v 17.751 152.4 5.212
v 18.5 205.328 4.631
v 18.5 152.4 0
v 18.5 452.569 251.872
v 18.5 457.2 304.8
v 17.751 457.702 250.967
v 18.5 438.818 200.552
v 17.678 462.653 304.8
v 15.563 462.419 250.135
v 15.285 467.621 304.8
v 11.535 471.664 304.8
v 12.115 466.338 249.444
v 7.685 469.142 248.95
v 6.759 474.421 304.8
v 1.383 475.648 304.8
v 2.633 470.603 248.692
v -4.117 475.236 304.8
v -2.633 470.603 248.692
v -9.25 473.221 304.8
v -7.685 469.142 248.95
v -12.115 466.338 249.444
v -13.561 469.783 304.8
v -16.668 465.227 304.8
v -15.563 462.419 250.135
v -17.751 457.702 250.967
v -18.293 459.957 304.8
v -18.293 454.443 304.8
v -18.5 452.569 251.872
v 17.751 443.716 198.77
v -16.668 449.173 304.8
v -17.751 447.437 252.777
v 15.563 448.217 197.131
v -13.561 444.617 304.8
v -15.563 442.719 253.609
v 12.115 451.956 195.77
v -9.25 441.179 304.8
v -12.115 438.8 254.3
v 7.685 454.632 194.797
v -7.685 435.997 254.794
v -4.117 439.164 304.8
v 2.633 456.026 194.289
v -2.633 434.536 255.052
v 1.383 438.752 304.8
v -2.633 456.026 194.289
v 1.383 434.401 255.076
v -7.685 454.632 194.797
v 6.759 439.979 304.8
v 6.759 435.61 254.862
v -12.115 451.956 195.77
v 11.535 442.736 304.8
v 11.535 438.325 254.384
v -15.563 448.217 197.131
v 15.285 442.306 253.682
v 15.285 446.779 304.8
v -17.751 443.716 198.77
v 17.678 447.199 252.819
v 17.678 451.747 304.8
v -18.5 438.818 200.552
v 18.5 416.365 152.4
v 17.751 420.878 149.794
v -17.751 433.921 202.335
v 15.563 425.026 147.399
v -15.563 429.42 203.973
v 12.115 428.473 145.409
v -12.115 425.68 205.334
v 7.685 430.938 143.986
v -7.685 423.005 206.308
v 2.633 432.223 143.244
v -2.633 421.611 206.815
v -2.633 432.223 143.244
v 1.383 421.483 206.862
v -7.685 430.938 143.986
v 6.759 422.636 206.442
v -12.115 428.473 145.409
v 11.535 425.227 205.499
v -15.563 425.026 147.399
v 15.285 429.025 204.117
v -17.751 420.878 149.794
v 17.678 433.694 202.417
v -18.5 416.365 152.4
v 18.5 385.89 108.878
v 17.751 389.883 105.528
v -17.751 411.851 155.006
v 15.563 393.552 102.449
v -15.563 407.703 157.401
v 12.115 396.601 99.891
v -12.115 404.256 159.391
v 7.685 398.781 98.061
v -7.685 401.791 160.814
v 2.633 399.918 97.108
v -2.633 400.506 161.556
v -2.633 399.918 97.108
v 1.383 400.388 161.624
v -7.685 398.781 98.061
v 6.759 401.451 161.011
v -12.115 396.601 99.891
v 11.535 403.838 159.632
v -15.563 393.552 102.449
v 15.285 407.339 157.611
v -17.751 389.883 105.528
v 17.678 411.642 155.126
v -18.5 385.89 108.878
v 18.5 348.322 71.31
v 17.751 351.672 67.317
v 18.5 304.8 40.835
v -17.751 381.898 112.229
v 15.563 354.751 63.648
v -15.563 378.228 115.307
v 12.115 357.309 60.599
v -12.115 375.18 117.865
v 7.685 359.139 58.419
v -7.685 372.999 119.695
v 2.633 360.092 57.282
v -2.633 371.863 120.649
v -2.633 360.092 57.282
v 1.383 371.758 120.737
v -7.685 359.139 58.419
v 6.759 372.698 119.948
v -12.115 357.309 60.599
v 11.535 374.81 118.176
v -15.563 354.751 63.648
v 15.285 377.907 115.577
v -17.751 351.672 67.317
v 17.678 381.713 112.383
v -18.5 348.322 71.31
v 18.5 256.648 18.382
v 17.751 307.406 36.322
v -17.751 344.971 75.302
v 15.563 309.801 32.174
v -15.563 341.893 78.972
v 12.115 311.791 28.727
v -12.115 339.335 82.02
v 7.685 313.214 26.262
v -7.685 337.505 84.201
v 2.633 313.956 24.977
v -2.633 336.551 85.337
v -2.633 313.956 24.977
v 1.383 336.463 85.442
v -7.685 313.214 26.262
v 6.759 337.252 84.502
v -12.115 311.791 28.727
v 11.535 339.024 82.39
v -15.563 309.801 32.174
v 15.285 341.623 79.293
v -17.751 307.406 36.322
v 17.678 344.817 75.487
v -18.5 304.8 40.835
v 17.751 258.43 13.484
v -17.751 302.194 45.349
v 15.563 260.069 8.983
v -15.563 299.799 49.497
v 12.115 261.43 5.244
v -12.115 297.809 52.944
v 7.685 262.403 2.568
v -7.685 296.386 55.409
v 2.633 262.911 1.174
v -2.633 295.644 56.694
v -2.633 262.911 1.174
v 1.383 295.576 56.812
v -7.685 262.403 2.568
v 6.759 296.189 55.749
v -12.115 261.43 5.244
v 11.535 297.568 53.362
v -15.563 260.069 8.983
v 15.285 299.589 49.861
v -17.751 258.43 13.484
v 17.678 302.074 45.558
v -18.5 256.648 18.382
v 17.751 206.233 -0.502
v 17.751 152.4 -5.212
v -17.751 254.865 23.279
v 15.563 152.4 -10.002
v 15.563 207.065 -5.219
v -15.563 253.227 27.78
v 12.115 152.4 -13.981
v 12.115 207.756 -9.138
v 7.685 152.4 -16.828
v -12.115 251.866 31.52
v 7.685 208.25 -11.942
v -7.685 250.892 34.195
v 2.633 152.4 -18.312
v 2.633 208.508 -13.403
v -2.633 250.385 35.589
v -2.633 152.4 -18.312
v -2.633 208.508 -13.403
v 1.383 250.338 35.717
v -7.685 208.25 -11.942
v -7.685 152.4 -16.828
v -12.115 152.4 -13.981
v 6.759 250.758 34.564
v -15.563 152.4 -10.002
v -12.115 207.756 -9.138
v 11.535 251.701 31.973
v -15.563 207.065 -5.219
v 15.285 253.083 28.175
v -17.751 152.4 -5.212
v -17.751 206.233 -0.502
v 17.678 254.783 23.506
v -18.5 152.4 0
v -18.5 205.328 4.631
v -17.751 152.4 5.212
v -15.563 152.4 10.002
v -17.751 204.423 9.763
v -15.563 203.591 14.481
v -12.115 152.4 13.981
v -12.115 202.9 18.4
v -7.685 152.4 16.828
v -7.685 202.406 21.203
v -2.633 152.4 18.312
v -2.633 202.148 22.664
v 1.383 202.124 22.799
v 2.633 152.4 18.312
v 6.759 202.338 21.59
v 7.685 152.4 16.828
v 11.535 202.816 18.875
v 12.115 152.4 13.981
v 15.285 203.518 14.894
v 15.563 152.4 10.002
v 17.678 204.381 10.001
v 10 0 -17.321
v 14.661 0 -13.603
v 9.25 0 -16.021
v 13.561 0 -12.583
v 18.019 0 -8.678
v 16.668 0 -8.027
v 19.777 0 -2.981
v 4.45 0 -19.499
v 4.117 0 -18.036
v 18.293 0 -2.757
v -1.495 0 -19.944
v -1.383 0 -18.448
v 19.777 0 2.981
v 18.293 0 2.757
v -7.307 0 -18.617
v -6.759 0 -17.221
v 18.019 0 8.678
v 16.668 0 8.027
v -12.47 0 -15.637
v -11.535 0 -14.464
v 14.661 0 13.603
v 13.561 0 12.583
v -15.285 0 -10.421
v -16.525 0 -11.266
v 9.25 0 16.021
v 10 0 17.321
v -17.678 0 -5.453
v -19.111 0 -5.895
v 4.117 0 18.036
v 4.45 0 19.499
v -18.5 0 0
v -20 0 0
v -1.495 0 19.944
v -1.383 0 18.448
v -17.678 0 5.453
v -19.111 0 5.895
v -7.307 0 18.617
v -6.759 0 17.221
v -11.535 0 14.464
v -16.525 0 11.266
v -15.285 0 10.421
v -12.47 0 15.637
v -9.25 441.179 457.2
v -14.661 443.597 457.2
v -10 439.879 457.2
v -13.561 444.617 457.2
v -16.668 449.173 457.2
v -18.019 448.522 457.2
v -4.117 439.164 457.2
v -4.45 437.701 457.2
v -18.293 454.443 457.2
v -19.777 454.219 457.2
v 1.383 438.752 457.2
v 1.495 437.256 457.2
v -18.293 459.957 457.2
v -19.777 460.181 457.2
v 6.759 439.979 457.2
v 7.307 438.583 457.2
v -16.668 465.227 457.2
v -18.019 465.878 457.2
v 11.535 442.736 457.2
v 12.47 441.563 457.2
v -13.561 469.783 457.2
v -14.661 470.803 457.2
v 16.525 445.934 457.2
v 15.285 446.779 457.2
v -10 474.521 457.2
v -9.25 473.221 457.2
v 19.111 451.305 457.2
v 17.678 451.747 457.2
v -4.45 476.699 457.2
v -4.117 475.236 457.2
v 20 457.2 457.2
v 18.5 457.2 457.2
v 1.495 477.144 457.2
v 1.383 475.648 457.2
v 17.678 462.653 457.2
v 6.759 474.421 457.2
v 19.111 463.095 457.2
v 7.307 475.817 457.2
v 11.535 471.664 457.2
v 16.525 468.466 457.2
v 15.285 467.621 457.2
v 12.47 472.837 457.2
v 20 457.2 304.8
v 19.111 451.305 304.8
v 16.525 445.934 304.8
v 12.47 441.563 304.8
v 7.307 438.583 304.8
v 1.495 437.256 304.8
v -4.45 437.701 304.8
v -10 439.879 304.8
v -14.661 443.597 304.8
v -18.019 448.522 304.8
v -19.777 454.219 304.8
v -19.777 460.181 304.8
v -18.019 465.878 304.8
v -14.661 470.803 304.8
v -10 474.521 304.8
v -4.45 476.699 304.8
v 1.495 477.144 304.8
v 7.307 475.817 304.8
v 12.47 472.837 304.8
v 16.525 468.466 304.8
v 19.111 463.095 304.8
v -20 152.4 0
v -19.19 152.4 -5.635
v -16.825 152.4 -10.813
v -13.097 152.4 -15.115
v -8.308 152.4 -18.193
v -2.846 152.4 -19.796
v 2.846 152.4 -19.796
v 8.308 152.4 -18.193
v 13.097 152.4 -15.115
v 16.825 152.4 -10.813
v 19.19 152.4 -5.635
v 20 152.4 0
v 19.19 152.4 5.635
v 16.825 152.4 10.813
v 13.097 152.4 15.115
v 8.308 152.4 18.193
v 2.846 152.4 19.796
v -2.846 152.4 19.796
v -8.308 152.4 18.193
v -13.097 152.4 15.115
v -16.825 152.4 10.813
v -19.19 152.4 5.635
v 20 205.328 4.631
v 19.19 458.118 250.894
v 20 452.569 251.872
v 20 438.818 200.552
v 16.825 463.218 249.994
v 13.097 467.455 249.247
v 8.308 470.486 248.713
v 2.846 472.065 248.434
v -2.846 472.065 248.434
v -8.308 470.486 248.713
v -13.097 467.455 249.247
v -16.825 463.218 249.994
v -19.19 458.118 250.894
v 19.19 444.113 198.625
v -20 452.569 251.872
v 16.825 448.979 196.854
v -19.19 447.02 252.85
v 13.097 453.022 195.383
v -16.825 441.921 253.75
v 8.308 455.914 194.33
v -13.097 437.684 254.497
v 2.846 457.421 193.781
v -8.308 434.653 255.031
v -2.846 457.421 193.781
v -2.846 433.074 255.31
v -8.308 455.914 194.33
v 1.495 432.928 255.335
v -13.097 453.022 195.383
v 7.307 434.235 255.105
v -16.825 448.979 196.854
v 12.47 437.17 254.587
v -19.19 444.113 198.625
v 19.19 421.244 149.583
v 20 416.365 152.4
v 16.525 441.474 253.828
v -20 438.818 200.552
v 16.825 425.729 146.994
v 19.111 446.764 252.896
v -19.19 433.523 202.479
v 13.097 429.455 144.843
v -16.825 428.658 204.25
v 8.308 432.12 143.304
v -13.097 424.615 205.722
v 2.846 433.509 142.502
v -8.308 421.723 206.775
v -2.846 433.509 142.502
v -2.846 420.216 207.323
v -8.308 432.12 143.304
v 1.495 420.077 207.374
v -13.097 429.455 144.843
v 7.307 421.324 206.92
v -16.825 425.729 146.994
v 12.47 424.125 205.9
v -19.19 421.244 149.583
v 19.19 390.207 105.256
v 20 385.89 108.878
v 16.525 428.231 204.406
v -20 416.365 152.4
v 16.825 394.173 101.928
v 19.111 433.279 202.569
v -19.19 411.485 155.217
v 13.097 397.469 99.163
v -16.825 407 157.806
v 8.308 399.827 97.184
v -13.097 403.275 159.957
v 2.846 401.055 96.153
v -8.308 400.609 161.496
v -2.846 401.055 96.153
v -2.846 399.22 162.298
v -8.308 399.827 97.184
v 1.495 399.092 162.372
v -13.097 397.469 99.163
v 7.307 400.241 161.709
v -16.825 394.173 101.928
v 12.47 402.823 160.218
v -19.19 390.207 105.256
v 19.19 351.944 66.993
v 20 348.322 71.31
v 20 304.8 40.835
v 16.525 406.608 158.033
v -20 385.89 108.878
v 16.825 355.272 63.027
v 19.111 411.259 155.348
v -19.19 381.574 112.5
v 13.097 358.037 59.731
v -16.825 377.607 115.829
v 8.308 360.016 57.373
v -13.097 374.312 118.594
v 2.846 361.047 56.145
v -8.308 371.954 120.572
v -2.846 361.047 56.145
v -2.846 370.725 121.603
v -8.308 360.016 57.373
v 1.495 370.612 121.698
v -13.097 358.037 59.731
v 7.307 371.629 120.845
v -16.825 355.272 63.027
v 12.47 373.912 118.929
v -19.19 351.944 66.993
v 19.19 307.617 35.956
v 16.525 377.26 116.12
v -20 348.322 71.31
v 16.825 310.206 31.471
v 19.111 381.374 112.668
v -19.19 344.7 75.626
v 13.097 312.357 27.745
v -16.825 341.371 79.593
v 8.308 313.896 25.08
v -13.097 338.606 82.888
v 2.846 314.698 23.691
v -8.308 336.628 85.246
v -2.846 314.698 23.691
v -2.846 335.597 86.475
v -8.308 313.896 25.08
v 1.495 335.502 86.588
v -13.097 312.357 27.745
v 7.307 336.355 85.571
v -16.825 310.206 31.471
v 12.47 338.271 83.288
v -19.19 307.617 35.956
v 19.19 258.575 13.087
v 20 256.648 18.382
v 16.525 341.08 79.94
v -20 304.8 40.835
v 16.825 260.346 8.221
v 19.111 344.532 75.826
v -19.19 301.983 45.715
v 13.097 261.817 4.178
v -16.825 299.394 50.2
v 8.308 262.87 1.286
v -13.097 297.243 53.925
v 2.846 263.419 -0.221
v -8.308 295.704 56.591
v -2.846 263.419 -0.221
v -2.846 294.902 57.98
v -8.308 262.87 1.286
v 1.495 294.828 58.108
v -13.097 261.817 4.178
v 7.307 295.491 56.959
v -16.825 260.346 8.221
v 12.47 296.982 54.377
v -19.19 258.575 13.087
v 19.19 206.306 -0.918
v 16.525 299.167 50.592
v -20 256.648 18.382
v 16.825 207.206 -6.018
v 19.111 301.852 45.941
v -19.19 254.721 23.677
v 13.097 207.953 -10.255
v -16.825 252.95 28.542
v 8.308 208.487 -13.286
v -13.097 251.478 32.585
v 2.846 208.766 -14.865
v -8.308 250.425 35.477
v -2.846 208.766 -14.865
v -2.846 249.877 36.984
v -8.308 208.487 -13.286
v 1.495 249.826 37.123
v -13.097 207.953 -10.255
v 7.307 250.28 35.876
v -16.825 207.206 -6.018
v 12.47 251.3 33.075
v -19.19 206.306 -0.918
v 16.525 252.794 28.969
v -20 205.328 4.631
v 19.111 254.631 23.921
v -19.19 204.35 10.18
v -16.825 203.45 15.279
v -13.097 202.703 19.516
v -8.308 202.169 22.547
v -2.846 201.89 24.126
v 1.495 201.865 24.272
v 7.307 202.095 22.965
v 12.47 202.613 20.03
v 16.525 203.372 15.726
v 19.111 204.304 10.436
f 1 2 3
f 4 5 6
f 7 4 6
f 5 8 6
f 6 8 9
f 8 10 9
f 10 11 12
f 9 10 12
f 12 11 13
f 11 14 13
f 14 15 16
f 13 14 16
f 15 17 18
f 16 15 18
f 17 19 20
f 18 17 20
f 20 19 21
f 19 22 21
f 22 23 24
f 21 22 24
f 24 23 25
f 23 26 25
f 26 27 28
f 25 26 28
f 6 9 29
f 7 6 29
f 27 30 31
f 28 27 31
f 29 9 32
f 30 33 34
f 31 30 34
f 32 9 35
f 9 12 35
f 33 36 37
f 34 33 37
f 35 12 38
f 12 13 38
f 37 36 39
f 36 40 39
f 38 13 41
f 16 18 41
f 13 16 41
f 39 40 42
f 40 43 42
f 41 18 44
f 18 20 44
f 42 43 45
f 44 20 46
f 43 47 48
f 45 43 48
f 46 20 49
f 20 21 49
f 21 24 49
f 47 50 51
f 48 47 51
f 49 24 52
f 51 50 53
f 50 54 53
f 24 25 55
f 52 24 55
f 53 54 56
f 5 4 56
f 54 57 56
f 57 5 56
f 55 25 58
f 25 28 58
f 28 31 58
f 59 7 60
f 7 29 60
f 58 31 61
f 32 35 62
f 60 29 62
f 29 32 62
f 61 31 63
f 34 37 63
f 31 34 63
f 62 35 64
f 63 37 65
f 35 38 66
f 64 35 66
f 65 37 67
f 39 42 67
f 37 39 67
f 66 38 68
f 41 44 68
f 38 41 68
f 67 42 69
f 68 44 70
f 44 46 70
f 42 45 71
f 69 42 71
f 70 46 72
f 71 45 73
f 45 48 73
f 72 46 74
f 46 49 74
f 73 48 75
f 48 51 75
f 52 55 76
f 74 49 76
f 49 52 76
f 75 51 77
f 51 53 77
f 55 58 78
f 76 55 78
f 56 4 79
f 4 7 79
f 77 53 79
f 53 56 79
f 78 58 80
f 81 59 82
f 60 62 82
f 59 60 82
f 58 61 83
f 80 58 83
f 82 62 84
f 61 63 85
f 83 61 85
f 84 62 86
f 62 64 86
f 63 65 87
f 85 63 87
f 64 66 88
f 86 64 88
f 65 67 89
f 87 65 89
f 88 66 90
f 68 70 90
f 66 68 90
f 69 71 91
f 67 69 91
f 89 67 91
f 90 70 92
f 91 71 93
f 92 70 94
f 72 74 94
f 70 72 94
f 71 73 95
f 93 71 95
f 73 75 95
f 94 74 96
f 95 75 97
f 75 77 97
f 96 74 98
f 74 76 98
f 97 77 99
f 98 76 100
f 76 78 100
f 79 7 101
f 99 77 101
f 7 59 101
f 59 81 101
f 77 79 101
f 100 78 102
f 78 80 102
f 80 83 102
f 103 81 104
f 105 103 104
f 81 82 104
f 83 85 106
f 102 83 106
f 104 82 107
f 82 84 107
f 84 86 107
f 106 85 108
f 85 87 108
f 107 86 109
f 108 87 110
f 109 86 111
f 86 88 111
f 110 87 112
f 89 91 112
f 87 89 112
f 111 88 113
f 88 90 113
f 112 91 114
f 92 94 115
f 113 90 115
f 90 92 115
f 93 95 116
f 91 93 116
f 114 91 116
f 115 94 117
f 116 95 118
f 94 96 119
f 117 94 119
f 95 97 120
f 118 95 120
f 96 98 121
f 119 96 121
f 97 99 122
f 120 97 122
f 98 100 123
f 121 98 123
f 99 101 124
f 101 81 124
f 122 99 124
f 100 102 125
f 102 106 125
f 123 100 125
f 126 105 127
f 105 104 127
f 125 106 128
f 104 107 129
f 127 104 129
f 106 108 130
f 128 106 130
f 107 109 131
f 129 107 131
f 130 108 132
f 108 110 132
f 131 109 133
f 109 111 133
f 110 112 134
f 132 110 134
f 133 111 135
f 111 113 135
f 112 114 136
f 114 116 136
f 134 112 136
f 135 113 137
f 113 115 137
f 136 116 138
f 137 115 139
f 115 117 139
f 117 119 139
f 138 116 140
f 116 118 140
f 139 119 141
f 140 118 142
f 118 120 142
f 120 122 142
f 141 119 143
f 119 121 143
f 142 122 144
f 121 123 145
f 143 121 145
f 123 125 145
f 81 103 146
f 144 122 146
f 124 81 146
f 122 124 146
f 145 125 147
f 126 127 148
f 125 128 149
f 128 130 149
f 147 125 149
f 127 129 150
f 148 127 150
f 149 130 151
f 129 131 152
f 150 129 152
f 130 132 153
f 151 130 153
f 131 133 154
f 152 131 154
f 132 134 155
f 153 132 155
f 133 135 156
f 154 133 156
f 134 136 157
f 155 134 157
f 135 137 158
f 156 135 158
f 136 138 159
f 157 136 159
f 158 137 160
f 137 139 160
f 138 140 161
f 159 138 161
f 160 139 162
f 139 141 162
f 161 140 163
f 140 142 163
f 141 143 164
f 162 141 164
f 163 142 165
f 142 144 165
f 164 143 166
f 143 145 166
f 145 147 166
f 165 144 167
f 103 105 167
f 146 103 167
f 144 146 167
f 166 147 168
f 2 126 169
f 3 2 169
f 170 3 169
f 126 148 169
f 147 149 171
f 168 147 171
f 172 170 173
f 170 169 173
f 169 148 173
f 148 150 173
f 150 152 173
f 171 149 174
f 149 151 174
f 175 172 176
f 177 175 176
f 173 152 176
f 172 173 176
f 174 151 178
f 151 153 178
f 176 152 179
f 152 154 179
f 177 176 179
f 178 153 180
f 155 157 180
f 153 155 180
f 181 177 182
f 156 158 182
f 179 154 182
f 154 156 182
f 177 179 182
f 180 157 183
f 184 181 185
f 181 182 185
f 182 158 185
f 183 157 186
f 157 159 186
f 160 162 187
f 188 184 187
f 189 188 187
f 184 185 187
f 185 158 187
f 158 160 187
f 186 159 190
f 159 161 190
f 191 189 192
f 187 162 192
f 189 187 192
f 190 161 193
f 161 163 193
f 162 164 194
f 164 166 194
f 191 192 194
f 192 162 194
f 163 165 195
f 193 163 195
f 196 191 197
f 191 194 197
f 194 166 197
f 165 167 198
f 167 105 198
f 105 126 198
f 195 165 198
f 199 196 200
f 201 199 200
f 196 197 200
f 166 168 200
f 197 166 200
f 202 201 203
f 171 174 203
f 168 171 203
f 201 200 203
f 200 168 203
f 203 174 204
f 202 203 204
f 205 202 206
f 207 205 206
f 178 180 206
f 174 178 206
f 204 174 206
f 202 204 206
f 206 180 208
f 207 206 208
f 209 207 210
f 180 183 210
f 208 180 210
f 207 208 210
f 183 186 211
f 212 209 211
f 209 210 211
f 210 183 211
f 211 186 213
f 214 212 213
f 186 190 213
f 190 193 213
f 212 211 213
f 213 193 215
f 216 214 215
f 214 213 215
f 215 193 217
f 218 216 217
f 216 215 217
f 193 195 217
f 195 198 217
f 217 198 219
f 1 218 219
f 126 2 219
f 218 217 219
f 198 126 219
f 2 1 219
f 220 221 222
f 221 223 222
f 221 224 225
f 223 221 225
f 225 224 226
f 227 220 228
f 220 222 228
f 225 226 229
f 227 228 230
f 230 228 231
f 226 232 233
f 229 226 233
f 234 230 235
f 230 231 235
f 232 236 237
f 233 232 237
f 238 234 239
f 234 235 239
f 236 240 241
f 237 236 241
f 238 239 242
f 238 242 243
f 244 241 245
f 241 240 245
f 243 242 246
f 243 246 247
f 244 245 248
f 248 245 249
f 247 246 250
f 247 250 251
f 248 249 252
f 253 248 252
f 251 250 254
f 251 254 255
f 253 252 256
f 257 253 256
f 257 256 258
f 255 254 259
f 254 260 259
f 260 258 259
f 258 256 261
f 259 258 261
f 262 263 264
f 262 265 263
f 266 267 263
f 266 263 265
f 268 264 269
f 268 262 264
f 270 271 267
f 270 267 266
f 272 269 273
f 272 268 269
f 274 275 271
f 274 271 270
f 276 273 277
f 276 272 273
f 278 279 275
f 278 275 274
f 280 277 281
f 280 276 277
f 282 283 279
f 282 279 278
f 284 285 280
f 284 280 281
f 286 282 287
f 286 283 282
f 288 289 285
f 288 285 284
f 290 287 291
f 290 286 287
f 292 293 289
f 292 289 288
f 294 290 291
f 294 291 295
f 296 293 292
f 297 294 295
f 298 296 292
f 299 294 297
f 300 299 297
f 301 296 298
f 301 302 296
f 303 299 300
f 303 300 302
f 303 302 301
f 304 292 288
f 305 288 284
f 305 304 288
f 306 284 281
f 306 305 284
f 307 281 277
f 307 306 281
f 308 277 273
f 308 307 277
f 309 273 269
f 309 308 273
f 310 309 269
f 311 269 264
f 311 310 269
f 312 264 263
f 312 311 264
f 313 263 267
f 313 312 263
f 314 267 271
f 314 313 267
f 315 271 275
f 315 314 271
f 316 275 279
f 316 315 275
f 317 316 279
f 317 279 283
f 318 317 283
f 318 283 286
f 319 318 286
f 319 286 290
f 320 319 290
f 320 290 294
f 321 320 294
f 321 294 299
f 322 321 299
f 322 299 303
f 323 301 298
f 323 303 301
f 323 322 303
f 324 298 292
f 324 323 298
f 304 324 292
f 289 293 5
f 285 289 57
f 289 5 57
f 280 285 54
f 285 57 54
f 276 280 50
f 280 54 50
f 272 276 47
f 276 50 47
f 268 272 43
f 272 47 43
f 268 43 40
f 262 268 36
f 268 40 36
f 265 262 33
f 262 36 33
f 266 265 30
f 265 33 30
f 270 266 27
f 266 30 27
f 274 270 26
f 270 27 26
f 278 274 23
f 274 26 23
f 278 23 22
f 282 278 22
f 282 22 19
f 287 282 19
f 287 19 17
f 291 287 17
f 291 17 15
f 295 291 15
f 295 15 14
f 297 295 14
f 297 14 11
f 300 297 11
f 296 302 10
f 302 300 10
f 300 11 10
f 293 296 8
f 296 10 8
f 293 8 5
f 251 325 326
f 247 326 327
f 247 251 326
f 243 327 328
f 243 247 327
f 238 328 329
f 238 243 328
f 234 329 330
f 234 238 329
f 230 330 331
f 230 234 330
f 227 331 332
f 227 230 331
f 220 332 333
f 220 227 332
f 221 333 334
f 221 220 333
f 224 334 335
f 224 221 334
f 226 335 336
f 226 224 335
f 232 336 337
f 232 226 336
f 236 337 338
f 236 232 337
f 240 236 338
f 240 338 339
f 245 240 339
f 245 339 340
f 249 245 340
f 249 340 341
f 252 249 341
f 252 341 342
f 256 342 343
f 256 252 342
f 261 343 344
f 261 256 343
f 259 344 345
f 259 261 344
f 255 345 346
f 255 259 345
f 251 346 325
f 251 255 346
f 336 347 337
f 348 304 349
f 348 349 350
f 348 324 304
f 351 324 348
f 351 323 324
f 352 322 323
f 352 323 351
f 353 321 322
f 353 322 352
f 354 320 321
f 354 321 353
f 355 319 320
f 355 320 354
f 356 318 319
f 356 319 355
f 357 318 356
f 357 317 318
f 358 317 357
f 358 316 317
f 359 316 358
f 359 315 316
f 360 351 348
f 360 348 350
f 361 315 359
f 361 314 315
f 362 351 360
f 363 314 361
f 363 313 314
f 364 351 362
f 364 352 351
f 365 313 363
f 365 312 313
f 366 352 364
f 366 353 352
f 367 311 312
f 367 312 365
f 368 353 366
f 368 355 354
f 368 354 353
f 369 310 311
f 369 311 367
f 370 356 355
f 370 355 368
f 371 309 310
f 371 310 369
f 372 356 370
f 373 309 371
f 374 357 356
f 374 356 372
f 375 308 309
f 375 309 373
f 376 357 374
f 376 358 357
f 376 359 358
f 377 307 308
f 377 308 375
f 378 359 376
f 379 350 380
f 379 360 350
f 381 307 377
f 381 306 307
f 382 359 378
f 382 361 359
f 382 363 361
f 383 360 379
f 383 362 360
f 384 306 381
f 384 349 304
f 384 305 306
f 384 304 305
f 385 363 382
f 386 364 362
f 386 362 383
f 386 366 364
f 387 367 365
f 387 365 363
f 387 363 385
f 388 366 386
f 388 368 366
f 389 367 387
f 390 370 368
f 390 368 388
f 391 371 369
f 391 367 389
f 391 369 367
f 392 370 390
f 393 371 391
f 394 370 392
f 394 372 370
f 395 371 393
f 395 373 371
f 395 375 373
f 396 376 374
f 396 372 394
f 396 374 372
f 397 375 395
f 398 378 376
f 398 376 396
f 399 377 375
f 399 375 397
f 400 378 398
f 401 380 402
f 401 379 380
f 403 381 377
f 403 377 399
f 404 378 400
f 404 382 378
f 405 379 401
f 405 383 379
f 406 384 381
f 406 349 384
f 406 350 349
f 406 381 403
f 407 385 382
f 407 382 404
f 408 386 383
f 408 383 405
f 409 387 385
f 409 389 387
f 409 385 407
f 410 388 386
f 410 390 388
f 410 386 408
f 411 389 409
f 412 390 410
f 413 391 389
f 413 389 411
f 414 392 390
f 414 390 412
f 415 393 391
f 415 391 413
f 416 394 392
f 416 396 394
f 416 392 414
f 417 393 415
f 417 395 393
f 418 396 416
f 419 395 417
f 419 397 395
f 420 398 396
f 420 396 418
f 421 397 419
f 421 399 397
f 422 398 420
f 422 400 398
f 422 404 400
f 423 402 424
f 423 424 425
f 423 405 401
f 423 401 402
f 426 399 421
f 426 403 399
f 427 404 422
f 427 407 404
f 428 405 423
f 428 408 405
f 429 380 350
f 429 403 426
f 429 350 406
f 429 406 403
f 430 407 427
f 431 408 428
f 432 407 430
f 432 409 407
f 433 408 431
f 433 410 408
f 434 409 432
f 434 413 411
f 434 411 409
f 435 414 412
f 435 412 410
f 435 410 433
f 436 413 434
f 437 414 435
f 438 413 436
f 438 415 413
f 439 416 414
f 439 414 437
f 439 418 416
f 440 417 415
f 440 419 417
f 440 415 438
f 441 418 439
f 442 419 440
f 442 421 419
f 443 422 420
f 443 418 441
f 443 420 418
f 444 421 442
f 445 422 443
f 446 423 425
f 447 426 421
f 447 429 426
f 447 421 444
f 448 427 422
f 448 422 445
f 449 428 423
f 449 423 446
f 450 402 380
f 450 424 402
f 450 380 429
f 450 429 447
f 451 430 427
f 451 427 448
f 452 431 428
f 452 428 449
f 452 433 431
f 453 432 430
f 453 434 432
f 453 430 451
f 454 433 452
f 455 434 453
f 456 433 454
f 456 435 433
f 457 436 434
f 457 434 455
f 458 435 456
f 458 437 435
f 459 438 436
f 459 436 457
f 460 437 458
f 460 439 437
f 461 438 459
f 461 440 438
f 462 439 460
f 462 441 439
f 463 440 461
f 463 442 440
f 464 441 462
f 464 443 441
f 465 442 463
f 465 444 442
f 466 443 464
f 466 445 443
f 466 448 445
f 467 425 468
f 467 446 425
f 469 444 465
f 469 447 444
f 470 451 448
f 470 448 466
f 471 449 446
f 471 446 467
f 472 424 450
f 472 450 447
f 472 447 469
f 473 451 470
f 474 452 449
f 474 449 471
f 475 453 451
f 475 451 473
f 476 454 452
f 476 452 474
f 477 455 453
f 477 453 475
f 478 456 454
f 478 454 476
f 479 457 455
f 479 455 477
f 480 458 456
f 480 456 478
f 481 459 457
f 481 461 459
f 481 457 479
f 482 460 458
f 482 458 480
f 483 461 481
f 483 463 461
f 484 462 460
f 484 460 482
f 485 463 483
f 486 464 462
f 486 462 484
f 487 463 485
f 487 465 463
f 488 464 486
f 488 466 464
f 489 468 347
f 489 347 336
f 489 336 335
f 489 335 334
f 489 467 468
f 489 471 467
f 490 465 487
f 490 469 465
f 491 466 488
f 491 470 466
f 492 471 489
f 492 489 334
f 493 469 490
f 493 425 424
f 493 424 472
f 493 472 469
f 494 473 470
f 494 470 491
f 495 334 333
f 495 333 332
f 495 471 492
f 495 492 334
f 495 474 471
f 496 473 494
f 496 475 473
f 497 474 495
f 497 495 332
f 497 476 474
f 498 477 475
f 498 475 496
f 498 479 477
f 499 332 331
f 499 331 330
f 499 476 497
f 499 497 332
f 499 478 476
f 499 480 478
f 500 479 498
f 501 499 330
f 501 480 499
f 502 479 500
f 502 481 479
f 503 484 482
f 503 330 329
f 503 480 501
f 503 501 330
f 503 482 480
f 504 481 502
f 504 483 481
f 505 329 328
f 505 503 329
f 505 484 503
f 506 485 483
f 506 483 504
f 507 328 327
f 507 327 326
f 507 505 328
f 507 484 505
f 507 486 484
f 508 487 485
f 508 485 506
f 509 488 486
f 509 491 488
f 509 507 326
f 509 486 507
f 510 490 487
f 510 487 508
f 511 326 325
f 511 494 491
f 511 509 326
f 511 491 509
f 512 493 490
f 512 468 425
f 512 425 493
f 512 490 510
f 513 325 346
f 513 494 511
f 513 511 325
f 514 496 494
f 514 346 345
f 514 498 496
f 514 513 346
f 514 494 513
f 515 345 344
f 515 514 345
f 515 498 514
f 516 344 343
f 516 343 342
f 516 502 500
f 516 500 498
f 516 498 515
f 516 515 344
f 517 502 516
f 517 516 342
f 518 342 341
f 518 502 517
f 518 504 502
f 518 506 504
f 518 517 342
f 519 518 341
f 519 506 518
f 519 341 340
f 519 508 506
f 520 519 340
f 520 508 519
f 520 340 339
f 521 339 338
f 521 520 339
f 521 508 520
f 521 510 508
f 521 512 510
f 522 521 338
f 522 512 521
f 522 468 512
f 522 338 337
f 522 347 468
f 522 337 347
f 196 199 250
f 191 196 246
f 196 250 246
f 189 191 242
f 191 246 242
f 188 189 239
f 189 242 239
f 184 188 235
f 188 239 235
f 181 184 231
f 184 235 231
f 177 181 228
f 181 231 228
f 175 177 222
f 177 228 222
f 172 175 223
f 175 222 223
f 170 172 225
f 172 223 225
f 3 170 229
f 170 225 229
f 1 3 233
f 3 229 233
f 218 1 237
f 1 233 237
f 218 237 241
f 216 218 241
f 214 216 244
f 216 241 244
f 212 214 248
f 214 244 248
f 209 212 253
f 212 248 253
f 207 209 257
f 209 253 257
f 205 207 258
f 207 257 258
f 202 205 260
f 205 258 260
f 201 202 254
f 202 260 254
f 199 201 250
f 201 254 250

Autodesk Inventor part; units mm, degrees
ref_plane "YZ Plane" through (0, 0, 0) normal (1, 0, 0) x (0, 1, 0)
ref_plane "XZ Plane" through (0, 0, 0) normal (0, 1, 0) x (-1, 0, 0)
sketch "Sketch1" plane through (0, 0, 0) normal (0, 1, 0) x (-1, 0, 0)
  circle A0 centre (0, 0) radius 20
  circle A1 centre (0, 0) radius 18.5
  dimension "d0" = 40
  dimension "d1" = 1.5
extrude "Extrusion1" add sketch "Sketch1" along normal blind 152.4
sketch "Sketch4" plane through (0, 152.4, 0) normal (0, 1, 0) x (1, 0, 0)
  circle A0 centre (0, 0) radius 18.5 projected
  circle A1 centre (0, 0) radius 20 projected
  point P0 (-20, 0)
ref_plane "Work Plane4" through (-20, 152.4, 0) normal (-1, 0, 0) x (0, -1, 0)
sketch "Sketch8" plane through (-20, 152.4, 0) normal (-1, 0, 0) x (0, -1, 0)
  line L0 (0, 0) -> (0, 304.8) construction
  arc A0 (-304.8, 304.8) -> (0, 0) centre (0, 304.8) ccw
  line L1 (0, 304.8) -> (-304.8, 304.8) construction
  point P0 (152.4, 0)
  dimension "d7" = 304.8
sweep "Sweep1" add profiles "Sketch4" path "Sketch8"
sketch "Sketch9" plane through (0, 457.2, 304.8) normal (0, 0, 1) x (1, 0, 0)
  circle A0 centre (0, 0) radius 18.5 projected
  circle A1 centre (0, 0) radius 20 projected
  point P0 (0, -457.2)
extrude "Extrusion2" add sketch "Sketch9" along normal blind 152.4
properties part number "sweep" material "ABS Plastic"
